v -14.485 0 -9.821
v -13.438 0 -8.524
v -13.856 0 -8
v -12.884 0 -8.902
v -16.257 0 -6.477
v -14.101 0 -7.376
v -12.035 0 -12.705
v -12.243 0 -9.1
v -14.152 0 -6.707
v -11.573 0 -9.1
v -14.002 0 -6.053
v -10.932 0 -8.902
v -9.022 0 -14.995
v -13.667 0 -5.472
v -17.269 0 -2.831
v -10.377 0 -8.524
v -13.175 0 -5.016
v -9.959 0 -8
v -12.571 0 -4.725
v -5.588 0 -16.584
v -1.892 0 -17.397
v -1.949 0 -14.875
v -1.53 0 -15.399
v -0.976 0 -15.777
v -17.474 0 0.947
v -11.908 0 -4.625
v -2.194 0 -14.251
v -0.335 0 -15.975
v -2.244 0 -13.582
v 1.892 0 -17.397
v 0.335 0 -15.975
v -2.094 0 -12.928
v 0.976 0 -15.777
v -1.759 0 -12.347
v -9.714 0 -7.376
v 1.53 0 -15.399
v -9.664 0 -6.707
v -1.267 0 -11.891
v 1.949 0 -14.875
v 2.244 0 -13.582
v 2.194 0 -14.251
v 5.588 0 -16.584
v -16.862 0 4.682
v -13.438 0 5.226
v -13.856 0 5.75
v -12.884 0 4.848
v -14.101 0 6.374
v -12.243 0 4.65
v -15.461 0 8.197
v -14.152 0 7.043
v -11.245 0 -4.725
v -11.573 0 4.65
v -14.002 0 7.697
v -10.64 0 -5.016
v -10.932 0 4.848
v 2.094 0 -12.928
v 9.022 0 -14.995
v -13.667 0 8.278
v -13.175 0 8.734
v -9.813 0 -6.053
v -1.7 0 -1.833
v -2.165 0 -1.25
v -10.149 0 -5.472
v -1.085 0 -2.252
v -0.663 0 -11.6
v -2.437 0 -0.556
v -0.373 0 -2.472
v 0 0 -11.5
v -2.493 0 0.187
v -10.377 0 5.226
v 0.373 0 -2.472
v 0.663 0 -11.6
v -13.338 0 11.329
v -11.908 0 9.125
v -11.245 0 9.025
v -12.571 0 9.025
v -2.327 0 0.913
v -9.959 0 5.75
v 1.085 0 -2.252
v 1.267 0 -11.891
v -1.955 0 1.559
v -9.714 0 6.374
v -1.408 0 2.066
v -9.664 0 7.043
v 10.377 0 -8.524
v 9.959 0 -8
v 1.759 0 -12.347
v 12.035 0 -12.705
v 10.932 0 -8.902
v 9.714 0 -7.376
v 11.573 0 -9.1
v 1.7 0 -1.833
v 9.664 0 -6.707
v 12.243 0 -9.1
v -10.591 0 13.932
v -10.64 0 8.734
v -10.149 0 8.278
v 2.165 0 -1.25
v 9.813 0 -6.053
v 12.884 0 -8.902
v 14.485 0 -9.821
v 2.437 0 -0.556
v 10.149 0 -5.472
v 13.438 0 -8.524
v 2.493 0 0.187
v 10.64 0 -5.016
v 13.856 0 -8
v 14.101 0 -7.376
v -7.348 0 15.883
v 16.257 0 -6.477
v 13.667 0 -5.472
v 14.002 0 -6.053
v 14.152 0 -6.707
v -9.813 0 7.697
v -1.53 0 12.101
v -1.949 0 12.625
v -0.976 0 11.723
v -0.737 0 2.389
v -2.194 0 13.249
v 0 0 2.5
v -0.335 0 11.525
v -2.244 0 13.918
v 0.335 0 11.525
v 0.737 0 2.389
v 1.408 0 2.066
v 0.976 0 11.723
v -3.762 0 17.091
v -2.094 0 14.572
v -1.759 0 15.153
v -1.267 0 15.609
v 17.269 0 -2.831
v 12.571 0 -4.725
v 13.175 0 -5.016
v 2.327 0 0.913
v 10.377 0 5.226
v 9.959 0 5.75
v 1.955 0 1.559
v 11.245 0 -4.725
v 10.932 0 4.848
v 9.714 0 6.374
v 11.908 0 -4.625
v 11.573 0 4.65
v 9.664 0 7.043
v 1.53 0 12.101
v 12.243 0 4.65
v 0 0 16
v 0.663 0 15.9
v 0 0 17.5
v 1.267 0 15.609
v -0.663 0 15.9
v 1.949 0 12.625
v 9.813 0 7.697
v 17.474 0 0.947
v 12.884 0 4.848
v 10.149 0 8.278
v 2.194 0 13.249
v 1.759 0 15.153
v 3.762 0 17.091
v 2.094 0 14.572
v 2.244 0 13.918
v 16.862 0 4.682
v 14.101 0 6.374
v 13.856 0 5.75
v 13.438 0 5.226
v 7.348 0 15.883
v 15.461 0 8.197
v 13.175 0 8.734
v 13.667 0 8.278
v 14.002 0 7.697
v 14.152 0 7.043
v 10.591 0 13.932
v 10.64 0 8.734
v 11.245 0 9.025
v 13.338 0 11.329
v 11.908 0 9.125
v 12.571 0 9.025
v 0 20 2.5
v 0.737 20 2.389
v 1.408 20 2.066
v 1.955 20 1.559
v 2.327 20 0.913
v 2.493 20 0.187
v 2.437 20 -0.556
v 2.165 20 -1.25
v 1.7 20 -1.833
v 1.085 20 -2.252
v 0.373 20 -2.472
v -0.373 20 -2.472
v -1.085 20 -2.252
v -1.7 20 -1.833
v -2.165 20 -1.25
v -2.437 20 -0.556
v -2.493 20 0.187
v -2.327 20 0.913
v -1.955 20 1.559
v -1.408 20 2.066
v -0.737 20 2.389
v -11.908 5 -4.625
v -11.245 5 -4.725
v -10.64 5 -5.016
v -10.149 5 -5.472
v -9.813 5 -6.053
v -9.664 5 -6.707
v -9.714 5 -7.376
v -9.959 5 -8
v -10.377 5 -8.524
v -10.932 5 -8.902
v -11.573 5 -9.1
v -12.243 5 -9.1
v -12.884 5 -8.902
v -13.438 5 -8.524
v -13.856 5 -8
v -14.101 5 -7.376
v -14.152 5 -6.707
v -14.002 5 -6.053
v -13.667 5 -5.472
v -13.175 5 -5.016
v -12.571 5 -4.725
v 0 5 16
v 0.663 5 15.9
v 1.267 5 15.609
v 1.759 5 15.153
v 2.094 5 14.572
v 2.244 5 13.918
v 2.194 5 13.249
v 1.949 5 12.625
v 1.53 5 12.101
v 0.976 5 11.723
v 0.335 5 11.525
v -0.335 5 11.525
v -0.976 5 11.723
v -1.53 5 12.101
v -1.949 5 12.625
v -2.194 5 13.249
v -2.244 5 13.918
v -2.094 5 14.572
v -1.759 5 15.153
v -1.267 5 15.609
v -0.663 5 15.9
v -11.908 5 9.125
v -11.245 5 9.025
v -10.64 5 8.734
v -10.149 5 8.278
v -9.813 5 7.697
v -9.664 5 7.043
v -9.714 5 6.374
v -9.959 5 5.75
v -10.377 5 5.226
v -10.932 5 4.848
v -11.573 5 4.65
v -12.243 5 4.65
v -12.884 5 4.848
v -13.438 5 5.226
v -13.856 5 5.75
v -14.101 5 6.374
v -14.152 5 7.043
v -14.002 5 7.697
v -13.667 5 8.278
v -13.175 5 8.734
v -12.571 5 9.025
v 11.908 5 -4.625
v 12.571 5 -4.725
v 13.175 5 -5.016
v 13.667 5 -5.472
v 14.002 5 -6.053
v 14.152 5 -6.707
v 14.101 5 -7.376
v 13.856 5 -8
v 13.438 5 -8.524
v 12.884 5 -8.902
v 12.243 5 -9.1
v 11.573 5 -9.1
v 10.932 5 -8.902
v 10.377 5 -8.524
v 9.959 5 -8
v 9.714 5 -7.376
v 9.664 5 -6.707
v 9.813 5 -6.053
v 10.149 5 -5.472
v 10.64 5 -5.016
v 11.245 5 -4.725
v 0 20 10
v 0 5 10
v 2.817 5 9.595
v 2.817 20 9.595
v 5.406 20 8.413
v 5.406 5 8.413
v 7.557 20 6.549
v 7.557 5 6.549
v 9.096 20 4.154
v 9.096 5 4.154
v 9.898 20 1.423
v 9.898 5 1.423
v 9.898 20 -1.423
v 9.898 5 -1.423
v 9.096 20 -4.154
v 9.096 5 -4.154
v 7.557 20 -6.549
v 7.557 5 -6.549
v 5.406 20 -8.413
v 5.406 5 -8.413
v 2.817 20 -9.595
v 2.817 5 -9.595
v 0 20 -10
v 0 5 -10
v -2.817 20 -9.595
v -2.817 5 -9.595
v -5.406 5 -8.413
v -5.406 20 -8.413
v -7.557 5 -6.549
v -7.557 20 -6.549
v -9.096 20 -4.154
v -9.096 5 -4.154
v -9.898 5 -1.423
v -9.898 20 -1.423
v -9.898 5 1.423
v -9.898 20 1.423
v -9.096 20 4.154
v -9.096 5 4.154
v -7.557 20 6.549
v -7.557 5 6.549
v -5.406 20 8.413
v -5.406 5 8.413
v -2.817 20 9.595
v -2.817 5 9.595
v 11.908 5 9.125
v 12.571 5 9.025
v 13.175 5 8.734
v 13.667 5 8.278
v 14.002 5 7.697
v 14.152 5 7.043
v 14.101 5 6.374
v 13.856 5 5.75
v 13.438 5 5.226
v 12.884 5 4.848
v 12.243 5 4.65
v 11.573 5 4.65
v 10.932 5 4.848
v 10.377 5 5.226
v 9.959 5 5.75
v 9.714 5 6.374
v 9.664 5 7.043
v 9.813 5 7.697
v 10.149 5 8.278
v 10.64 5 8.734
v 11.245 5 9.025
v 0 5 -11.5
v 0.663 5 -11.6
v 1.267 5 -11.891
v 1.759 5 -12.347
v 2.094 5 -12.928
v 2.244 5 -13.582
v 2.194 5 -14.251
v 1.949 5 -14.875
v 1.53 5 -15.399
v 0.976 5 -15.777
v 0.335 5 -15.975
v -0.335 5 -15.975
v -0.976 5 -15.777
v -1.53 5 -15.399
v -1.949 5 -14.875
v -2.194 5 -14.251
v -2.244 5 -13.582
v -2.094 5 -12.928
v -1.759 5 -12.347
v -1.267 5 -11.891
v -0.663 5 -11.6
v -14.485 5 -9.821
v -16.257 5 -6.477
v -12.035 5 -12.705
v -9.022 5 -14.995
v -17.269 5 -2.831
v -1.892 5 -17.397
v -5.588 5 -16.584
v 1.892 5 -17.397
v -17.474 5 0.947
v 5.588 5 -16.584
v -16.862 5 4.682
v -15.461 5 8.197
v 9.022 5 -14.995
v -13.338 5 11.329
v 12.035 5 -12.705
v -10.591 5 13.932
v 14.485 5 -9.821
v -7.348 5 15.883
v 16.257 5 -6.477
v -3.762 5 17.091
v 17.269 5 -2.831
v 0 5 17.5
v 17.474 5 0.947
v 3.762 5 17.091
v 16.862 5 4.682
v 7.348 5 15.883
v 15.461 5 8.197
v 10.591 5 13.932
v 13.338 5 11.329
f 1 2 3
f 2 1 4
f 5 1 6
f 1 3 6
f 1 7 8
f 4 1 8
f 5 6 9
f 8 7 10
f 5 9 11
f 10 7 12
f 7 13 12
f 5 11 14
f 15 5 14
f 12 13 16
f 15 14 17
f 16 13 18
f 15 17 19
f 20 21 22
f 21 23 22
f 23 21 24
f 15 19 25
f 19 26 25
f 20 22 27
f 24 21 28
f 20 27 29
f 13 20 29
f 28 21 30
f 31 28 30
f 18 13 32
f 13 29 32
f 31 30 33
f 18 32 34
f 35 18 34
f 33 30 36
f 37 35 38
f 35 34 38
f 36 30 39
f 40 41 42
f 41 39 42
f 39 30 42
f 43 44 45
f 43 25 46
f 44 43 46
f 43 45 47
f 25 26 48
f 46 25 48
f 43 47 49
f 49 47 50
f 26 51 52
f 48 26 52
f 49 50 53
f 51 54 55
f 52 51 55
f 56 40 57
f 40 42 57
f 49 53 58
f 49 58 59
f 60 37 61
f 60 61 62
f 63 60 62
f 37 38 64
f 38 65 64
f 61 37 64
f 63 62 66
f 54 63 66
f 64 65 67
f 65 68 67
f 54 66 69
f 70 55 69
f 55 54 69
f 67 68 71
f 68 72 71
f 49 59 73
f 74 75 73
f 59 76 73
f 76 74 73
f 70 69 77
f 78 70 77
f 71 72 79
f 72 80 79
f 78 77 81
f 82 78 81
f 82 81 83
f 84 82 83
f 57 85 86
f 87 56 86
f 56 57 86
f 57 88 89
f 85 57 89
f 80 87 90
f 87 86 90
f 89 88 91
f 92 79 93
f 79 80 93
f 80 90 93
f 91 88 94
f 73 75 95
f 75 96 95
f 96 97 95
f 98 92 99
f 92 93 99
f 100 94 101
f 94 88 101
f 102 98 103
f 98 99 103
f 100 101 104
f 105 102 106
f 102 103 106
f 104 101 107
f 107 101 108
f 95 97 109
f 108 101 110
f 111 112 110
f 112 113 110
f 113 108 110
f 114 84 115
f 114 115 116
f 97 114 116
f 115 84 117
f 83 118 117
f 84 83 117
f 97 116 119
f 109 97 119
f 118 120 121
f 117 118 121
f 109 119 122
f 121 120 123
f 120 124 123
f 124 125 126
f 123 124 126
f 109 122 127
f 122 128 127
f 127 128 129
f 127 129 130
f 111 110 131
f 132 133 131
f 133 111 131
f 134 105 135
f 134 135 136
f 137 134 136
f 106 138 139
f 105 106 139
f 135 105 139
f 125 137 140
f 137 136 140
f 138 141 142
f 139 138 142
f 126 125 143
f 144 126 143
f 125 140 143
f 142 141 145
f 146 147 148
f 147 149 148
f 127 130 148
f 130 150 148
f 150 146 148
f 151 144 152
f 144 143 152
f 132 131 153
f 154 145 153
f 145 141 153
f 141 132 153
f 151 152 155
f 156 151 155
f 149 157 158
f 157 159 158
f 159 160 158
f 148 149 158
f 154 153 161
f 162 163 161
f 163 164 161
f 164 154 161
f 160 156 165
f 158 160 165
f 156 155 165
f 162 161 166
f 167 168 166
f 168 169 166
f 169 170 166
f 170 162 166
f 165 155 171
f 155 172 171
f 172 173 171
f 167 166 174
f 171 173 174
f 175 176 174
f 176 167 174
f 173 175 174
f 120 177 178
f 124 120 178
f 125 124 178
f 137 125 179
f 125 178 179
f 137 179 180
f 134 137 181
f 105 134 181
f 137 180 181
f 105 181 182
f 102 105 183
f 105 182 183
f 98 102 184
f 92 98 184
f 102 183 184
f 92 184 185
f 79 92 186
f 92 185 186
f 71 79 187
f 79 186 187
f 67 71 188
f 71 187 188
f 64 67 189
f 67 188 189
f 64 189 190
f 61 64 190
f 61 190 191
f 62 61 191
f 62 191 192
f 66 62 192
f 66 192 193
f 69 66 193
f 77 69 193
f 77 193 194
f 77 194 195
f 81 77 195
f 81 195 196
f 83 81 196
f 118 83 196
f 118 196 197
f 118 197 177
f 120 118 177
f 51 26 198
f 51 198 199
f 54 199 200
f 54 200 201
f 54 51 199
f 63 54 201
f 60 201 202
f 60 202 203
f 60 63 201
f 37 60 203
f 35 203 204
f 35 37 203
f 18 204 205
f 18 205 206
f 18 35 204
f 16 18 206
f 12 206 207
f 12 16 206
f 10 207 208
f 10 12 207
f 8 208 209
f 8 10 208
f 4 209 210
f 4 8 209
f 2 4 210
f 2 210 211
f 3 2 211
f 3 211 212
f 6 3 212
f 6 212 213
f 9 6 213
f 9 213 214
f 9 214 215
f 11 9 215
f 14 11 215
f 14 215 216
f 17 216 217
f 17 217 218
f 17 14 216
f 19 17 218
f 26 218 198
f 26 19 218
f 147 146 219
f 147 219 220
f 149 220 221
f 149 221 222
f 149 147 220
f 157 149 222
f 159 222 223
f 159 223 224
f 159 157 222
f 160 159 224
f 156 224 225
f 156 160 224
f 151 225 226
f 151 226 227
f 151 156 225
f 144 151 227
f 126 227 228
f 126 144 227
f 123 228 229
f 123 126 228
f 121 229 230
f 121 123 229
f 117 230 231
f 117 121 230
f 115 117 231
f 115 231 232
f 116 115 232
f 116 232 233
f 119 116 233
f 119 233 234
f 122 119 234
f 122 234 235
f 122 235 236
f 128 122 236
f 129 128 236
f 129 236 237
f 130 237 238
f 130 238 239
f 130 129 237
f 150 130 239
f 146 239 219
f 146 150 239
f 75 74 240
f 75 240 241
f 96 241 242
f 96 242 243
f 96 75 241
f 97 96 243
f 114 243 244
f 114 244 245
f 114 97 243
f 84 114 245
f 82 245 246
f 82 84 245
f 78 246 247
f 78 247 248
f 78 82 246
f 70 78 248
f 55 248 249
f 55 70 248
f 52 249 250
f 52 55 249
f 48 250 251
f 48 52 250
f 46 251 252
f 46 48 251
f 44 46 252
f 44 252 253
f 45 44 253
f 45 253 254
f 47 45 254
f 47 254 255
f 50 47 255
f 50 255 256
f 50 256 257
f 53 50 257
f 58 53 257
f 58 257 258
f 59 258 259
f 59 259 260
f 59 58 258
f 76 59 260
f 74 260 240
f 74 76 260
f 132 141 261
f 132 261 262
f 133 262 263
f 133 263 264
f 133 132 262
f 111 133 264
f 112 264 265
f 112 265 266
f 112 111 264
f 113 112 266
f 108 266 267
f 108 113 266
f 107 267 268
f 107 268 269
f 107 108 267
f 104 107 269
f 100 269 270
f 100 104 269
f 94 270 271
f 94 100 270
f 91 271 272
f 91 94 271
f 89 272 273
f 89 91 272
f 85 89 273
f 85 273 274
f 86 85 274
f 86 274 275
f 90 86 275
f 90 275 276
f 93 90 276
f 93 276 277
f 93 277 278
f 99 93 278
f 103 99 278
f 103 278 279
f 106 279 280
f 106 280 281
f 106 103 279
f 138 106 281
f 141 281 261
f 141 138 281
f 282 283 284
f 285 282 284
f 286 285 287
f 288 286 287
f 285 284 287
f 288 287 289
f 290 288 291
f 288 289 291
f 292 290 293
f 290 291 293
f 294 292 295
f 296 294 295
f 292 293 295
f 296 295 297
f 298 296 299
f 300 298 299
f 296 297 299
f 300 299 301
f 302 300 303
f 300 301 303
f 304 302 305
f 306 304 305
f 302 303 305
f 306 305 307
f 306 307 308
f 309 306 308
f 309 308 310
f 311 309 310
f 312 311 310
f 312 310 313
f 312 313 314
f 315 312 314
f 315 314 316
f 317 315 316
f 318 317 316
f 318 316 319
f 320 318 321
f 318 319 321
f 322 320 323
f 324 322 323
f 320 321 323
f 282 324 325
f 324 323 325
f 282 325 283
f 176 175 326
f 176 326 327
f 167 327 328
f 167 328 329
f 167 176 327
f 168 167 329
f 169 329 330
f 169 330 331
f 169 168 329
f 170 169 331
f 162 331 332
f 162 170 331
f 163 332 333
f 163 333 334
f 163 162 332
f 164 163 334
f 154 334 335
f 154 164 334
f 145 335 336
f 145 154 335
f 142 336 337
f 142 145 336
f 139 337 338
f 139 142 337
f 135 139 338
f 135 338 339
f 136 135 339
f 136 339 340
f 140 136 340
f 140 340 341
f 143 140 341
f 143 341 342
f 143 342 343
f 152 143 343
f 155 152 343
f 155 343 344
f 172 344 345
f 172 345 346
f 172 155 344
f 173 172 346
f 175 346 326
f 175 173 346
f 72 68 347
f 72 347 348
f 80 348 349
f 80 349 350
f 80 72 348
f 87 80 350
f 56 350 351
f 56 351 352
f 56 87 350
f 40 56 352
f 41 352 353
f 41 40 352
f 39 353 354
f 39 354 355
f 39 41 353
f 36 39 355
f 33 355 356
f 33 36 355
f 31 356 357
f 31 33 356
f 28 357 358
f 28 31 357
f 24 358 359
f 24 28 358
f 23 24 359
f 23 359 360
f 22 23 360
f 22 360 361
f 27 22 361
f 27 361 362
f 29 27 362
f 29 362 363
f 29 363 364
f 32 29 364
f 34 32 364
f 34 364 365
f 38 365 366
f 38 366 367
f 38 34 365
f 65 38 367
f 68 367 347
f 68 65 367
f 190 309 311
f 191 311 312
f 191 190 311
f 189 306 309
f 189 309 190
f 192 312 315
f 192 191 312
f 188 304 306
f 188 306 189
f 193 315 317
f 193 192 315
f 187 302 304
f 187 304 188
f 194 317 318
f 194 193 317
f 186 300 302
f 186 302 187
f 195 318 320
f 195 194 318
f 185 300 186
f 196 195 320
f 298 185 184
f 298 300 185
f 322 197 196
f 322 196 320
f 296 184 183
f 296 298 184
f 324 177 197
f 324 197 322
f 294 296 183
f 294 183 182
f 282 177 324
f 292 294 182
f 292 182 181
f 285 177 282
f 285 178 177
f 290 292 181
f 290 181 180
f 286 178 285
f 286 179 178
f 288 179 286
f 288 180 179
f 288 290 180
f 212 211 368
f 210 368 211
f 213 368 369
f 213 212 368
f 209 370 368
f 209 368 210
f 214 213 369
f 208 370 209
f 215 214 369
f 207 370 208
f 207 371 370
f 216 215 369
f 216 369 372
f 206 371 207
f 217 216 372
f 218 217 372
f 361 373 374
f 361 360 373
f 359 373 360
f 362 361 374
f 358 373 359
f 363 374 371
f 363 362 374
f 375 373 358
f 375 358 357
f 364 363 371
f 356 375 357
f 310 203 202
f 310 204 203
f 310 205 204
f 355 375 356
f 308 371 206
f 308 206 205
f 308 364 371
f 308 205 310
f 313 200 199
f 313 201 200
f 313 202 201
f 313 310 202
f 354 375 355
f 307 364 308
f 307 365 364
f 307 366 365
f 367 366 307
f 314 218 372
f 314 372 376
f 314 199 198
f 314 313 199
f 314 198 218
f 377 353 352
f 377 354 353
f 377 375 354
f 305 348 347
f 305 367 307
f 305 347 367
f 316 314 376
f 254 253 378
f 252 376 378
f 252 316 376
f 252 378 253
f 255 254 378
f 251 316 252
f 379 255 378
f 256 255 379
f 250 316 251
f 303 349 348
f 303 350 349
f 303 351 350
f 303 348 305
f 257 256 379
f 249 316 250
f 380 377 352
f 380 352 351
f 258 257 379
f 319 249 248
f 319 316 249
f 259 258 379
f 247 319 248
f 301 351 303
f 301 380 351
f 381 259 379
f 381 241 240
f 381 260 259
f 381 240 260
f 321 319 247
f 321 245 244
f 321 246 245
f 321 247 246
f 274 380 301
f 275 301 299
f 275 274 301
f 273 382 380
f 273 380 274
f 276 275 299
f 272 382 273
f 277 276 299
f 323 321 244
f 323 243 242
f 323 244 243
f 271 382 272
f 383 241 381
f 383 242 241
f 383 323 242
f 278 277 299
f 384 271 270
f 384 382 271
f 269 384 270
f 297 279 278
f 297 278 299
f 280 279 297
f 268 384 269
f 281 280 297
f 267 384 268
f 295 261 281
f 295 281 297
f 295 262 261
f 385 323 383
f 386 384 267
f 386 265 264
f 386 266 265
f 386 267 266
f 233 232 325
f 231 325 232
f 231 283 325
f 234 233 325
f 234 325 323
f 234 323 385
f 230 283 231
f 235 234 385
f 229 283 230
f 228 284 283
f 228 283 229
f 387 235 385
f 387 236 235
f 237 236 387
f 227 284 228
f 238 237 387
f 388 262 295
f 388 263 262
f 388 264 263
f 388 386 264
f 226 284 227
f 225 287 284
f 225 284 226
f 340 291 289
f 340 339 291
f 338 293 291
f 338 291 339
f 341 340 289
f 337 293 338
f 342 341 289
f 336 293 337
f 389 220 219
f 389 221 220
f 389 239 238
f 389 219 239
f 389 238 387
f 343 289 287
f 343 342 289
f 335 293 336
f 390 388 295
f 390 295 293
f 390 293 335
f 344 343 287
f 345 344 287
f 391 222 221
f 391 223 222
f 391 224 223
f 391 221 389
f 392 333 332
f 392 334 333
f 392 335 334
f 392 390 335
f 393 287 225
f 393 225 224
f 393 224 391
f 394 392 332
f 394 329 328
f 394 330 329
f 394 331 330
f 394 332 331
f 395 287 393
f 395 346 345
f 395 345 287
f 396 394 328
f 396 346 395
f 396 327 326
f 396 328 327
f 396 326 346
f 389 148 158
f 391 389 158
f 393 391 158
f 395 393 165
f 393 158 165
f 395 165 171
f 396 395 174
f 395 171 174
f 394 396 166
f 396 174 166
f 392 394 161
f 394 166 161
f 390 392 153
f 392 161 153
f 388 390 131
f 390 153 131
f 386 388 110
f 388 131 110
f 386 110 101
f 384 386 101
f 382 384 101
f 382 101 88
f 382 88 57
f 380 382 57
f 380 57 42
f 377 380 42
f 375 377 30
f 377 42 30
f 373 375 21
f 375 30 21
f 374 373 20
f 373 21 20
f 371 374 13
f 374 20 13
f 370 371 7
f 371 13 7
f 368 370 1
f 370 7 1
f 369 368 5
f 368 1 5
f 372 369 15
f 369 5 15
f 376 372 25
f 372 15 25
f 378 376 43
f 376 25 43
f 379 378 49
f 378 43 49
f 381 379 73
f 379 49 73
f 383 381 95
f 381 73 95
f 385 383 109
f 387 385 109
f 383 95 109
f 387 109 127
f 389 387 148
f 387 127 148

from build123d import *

# Parameters (mm, degrees)
SKETCH2_R           = 17.5
SKETCH2_R_2         = 2.25
BOSS_EXTRUDE1_DEPTH = 5
SKETCH3_R           = 10
BOSS_EXTRUDE2_DEPTH = 15
SKETCH4_R           = 2.5
CUT_EXTRUDE1_DEPTH  = 32.819805153


with BuildPart() as part:
    # Sketch2 → Boss-Extrude1 (new body)
    with BuildSketch(Plane(origin=(0, 0, 0), x_dir=(1, 0, 0), z_dir=(0, 1, 0))):
        with Locations(Location((0, 0, 0), (0, 0, 270))):
            Circle(SKETCH2_R)
        with Locations(Location((0, 13.75, 0), (0, 0, 270))):
            Circle(SKETCH2_R_2, mode=Mode.SUBTRACT)
        with Locations(Location((11.907849302, 6.875, 0), (0, 0, 270))):
            Circle(SKETCH2_R_2, mode=Mode.SUBTRACT)
        with Locations(Location((11.907849302, -6.875, 0), (0, 0, 270))):
            Circle(SKETCH2_R_2, mode=Mode.SUBTRACT)
        with Locations(Location((0, -13.75, 0), (0, 0, 270))):
            Circle(SKETCH2_R_2, mode=Mode.SUBTRACT)
        with Locations(Location((-11.907849302, -6.875, 0), (0, 0, 270))):
            Circle(SKETCH2_R_2, mode=Mode.SUBTRACT)
        with Locations(Location((-11.907849302, 6.875, 0), (0, 0, 270))):
            Circle(SKETCH2_R_2, mode=Mode.SUBTRACT)
    extrude(amount=BOSS_EXTRUDE1_DEPTH)

    # Sketch3 → Boss-Extrude2 (add)
    with BuildSketch(Plane(origin=(0, 5, 0), x_dir=(1, 0, 0), z_dir=(0, 1, 0))):
        with Locations(Location((0, 0, 0), (0, 0, 270))):
            Circle(SKETCH3_R)
    extrude(amount=BOSS_EXTRUDE2_DEPTH)

    # Sketch4 → Cut-Extrude1 (cut, through all)
    with BuildSketch(Plane(origin=(0, 20, 0), x_dir=(1, 0, 0), z_dir=(0, 1, 0))):
        with Locations(Location((0, 0, 0), (0, 0, 270))):
            Circle(SKETCH4_R)
    extrude(amount=-CUT_EXTRUDE1_DEPTH, mode=Mode.SUBTRACT)


solid = part.part
